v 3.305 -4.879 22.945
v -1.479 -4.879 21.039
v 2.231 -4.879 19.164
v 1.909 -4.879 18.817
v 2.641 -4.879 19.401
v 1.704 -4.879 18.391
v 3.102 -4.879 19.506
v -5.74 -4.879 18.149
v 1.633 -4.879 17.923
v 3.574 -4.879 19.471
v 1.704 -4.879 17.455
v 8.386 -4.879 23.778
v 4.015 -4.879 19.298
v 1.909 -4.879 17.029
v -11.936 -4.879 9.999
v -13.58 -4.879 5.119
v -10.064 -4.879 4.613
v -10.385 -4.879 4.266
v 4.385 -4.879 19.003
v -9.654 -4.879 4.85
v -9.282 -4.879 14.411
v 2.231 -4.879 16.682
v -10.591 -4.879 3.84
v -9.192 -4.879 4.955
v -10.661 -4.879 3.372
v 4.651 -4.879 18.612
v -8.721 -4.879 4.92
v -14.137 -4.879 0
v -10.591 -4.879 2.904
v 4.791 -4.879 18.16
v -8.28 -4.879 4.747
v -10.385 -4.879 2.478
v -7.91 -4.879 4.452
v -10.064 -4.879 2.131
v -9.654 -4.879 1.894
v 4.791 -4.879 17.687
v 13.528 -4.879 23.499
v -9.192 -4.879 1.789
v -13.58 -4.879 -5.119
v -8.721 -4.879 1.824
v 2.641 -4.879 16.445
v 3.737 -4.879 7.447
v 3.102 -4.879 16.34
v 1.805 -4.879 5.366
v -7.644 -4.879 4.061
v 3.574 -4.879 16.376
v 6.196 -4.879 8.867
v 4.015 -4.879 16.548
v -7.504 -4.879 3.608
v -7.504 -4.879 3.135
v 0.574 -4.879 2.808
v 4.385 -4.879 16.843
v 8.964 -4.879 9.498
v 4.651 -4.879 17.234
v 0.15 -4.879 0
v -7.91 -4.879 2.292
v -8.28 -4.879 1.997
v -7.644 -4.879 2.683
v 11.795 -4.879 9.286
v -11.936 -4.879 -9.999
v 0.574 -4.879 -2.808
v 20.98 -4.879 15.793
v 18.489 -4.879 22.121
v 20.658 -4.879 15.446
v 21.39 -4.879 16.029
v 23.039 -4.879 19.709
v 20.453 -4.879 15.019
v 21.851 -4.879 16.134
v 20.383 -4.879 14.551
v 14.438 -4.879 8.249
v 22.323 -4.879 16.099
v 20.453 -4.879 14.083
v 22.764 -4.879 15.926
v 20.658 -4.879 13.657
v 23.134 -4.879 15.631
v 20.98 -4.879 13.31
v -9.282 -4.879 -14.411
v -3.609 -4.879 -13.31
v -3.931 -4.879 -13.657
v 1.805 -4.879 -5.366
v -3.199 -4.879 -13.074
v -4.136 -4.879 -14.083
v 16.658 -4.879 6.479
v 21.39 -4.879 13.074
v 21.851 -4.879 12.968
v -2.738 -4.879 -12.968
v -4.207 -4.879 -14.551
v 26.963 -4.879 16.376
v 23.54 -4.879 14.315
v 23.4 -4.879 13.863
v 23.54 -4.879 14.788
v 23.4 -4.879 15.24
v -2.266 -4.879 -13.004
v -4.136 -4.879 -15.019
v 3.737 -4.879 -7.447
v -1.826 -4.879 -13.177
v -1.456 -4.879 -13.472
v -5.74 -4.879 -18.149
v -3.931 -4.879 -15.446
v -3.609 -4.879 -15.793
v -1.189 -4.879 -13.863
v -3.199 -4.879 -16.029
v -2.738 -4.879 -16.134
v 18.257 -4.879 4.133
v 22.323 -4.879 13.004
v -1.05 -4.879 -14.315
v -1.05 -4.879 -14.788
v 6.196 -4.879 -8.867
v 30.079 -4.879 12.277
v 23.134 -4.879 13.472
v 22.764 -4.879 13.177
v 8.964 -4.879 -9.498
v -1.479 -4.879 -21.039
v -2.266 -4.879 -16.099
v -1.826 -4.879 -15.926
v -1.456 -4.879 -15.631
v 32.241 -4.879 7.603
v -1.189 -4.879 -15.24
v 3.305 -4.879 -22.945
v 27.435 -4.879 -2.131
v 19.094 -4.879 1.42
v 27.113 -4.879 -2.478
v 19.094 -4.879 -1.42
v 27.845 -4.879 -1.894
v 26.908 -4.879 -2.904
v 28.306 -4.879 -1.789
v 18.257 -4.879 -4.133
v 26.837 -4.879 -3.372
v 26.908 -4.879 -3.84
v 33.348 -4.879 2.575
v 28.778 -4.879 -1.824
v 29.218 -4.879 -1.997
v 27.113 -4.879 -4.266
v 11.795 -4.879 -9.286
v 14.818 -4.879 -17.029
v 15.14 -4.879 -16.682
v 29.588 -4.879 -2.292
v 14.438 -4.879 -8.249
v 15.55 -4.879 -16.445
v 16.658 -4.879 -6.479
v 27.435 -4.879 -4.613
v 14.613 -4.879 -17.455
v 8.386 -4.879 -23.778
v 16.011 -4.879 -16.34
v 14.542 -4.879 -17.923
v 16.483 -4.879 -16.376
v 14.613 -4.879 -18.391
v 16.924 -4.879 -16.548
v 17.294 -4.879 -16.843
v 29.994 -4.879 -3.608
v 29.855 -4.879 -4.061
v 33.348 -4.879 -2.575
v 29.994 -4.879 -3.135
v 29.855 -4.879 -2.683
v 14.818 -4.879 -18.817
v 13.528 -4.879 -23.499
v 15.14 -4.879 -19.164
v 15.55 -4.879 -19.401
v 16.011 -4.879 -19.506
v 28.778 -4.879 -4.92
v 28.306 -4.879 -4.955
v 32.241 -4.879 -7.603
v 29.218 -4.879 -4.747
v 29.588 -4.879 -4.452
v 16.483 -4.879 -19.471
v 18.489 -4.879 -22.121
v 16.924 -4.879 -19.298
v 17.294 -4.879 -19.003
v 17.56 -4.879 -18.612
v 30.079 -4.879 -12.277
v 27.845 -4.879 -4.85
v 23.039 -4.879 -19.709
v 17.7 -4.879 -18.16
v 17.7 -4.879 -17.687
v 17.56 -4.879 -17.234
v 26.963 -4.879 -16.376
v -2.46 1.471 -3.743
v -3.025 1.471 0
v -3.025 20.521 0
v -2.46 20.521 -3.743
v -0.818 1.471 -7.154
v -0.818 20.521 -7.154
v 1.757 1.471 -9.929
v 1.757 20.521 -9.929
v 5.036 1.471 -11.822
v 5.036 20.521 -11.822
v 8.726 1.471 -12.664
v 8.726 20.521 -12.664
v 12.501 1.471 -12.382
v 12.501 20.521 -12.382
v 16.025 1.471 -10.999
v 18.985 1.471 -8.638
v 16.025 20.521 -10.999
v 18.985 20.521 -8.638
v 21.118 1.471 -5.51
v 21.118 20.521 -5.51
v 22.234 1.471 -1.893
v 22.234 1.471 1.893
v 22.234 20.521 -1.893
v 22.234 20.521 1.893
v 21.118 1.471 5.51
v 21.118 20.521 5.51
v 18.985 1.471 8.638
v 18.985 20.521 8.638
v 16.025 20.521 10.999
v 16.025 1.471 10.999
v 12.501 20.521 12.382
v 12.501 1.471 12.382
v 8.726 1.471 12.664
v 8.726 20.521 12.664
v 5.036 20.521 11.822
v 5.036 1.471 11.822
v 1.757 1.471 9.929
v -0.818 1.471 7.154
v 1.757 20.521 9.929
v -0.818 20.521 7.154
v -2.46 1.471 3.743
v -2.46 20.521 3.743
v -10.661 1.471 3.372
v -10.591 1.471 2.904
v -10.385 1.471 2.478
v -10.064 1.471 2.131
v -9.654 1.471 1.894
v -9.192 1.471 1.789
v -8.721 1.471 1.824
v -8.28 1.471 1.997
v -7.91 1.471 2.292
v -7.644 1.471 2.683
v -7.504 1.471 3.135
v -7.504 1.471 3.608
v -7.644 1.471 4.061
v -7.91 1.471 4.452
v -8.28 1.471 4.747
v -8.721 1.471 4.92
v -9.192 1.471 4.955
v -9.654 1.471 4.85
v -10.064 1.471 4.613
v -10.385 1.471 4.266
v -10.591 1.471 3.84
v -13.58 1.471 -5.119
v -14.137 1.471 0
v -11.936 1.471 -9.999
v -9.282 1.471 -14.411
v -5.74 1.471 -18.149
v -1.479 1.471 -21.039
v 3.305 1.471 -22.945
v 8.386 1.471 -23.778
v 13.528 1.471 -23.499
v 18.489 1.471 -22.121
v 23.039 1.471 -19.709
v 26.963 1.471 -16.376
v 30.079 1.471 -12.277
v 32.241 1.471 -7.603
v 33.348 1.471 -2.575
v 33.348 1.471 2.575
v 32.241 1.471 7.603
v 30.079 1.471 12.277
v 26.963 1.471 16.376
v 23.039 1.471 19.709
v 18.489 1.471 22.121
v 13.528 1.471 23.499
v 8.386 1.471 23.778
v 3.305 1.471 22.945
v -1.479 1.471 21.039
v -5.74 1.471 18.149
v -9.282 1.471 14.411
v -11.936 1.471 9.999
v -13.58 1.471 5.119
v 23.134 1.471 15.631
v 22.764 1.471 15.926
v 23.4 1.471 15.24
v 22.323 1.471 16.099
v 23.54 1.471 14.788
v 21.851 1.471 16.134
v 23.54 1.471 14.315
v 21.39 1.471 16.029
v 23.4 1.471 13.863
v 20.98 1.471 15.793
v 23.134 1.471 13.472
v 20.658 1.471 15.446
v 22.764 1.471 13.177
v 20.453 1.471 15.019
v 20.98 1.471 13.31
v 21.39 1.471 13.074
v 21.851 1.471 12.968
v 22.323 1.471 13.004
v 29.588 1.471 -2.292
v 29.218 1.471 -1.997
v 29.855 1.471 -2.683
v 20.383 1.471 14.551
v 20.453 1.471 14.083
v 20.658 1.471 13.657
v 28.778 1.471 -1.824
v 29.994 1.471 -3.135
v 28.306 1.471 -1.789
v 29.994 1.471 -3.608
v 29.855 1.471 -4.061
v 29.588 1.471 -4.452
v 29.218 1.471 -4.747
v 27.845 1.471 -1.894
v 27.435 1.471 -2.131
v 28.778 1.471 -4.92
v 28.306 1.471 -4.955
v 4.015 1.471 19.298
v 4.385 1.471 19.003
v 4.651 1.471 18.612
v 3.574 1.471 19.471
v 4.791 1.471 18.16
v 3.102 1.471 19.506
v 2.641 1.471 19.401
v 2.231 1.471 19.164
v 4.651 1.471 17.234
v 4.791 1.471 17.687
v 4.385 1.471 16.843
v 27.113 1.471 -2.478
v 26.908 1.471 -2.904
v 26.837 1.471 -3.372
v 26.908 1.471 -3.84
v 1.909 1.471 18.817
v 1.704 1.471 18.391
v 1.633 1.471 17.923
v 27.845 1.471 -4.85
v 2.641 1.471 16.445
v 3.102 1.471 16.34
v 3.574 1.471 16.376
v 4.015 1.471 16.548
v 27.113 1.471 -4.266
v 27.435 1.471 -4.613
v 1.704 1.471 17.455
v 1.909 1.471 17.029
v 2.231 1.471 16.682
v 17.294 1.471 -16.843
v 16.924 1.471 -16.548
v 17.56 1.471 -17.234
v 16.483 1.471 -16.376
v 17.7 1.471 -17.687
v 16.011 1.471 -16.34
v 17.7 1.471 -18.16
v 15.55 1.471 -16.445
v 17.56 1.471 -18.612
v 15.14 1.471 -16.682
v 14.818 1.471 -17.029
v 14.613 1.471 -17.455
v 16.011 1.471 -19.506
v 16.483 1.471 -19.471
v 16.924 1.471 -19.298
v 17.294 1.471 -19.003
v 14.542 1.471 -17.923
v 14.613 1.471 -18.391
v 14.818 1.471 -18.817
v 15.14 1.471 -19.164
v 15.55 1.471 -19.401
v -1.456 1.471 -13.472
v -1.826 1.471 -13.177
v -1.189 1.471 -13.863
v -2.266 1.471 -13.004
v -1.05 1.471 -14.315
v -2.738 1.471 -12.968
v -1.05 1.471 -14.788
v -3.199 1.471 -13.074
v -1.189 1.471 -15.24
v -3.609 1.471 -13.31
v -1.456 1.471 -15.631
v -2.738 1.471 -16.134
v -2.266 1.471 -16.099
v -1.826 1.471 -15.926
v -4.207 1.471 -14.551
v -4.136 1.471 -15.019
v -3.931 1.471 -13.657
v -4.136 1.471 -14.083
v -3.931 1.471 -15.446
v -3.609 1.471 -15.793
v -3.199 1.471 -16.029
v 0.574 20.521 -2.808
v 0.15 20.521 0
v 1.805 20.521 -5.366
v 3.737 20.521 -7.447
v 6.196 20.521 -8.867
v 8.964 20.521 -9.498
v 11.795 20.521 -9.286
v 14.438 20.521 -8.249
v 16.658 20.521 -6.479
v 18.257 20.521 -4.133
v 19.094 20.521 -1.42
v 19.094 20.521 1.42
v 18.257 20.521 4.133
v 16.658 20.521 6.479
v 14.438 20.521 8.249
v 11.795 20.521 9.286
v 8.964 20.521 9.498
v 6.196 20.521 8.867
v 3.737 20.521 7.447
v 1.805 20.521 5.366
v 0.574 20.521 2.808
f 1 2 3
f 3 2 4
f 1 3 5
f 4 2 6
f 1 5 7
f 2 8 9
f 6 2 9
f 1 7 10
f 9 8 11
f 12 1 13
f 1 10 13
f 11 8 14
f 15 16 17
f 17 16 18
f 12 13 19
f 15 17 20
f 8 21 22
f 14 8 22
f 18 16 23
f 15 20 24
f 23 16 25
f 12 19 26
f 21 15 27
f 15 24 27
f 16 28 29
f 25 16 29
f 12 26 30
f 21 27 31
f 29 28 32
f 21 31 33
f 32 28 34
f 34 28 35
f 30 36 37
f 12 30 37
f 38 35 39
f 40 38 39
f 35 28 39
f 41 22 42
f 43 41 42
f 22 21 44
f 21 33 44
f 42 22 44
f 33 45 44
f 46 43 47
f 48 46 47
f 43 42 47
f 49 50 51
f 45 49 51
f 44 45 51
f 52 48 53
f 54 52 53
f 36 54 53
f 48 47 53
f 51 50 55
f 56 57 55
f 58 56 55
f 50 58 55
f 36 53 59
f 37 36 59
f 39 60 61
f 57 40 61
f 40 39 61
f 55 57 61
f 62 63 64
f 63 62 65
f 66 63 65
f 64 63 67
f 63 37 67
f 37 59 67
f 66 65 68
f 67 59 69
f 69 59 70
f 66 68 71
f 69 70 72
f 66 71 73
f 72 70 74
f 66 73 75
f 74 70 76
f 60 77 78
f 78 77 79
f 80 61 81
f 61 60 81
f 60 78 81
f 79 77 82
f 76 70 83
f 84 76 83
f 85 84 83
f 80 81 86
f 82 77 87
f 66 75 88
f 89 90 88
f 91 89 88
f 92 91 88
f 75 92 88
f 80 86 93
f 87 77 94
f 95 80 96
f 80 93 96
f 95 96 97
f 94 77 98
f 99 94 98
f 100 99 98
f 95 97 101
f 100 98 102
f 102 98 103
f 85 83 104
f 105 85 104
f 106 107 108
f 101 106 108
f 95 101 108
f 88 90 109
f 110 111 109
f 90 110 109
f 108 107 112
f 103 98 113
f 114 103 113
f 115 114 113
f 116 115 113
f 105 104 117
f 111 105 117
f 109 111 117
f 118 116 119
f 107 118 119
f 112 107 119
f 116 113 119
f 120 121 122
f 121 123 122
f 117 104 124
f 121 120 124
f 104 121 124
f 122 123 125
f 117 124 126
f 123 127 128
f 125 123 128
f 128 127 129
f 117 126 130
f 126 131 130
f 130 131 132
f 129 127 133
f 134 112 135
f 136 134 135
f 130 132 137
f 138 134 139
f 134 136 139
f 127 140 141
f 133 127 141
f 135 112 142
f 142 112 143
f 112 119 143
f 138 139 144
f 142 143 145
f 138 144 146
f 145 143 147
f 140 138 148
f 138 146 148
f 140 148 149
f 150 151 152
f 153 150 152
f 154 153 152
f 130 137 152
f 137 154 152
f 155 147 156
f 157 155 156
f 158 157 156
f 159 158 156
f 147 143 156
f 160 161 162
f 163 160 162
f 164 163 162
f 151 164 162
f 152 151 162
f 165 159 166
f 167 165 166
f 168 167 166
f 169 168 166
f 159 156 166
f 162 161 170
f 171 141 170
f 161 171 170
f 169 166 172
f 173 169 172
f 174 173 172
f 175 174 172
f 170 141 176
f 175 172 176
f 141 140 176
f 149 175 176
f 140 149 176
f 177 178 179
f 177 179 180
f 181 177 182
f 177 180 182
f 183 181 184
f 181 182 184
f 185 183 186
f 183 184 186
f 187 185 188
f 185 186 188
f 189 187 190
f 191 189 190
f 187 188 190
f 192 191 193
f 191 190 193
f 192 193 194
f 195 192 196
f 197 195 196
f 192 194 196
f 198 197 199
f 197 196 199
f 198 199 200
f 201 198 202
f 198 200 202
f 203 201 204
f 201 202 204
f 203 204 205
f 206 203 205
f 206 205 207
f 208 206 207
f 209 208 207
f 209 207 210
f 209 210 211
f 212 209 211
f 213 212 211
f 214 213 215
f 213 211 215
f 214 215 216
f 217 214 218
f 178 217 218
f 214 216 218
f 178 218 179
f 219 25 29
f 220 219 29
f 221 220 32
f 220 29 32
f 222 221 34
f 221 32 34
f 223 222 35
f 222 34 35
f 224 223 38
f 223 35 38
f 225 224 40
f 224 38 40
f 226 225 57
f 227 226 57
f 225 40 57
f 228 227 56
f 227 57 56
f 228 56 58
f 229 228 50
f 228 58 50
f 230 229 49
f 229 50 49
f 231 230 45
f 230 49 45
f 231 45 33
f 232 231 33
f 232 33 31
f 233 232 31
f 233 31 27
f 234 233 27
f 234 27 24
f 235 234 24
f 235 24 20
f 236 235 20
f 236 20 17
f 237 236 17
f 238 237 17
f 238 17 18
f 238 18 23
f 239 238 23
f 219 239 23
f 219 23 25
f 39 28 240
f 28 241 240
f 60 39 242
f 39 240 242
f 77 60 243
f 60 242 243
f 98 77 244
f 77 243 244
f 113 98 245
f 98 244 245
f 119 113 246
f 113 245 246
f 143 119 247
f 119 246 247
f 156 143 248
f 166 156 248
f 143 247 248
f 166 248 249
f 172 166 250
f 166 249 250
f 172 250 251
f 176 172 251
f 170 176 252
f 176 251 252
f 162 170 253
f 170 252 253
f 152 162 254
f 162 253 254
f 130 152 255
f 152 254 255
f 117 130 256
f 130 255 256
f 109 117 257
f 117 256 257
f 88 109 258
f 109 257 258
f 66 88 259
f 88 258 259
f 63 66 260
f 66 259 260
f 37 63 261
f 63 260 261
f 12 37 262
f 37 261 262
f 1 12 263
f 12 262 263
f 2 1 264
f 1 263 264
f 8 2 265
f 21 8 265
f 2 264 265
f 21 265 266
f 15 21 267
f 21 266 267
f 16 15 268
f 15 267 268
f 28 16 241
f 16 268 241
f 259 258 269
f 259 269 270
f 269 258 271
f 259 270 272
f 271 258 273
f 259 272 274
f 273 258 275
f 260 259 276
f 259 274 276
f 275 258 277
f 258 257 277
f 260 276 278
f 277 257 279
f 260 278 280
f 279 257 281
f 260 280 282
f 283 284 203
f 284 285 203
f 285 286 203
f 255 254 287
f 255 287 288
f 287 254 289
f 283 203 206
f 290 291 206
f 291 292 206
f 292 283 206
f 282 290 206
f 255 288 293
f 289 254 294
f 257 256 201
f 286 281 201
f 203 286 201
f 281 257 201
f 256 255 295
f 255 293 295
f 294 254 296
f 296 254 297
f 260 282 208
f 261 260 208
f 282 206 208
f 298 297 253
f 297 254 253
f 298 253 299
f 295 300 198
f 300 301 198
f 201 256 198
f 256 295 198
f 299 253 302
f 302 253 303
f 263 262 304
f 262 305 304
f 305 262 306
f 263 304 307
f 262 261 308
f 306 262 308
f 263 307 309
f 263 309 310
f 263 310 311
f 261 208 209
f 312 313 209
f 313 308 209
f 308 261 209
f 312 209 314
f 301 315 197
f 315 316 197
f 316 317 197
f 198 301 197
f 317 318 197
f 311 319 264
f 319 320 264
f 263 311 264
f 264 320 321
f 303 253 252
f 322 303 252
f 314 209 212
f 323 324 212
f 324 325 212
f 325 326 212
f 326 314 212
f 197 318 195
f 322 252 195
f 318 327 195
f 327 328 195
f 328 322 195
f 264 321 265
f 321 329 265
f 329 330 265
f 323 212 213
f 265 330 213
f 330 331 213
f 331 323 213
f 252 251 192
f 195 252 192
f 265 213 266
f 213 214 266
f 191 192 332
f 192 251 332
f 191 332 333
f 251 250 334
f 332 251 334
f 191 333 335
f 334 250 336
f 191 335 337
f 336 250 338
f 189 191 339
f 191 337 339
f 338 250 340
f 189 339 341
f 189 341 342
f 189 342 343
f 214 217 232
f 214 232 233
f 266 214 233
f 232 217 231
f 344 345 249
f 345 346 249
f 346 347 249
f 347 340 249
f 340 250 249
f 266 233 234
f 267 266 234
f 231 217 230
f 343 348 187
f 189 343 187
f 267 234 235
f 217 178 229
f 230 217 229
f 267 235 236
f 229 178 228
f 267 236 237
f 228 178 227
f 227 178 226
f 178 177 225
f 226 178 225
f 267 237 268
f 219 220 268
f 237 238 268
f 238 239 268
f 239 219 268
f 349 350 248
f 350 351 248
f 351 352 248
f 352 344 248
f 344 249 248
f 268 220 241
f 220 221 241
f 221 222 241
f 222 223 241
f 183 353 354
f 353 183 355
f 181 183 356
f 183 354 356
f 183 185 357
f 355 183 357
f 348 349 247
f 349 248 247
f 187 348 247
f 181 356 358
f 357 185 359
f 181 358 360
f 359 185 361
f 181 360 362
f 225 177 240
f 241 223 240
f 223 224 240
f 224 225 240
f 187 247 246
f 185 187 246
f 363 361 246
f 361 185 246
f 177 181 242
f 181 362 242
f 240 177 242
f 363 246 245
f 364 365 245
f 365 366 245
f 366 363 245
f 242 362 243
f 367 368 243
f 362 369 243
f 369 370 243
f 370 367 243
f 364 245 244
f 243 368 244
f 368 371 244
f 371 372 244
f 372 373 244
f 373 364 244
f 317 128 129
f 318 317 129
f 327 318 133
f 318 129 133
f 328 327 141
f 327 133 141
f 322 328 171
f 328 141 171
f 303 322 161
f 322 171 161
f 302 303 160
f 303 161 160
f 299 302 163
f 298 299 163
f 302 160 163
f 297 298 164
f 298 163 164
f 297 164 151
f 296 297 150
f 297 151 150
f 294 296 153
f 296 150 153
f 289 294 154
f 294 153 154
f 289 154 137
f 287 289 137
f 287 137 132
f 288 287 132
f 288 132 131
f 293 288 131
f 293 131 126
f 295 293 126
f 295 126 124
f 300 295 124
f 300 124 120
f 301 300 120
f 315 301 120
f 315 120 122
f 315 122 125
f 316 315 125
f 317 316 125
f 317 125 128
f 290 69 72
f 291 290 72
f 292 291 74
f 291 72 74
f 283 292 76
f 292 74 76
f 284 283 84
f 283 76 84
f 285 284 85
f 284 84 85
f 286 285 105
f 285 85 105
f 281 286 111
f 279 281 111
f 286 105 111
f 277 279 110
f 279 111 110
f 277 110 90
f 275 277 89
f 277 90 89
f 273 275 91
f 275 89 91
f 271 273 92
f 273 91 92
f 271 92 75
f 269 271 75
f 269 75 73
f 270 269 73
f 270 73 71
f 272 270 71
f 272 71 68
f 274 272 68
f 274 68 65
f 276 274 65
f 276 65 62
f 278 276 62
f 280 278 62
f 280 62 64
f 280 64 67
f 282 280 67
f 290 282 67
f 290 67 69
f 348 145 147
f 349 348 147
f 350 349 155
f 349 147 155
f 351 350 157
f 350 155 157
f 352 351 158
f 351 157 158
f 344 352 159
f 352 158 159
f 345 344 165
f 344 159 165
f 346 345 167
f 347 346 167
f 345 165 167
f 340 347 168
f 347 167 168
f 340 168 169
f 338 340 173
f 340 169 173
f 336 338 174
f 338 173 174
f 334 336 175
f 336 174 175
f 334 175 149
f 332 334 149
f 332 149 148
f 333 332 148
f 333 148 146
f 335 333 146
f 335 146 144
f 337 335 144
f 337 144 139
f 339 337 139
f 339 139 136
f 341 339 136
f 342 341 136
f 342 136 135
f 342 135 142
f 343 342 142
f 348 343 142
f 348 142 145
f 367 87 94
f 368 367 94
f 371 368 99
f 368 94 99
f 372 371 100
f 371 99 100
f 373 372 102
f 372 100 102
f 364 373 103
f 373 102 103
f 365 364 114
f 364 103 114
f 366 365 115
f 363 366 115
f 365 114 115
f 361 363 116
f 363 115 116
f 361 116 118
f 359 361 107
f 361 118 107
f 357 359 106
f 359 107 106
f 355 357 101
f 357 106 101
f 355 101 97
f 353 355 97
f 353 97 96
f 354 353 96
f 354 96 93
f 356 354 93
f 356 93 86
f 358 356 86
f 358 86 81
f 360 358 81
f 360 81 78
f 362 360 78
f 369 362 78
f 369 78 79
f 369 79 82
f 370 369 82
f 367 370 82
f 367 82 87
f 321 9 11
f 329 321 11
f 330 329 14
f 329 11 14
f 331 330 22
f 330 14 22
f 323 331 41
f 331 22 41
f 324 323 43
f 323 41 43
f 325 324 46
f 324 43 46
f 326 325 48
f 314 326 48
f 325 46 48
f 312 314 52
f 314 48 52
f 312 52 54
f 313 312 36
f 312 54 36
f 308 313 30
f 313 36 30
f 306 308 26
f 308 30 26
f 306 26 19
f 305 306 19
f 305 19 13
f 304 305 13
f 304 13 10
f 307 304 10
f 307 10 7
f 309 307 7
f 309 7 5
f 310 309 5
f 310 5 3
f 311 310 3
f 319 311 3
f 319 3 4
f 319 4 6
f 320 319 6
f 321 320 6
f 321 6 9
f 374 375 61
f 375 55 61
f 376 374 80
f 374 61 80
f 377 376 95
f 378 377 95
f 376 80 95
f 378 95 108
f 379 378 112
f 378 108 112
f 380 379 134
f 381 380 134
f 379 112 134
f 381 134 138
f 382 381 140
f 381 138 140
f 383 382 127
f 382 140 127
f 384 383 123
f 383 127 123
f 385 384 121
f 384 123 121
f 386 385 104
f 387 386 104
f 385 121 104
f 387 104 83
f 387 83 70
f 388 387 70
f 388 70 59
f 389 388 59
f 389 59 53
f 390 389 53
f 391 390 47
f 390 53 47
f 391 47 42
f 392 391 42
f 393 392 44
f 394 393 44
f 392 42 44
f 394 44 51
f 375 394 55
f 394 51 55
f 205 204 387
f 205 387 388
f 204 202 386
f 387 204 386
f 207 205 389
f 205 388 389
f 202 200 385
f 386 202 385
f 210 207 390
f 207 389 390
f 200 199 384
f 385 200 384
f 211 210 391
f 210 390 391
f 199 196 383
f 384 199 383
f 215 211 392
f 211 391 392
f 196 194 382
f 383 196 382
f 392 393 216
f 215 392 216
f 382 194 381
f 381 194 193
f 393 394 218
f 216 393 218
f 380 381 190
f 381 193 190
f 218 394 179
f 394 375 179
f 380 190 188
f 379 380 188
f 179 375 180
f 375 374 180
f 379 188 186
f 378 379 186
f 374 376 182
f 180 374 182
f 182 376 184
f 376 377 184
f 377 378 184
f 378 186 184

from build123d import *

# Parameters (mm, degrees)
F_1_8_0_125_DIAMETER_HOLE1_D = 3.175


with BuildPart() as part:
    # Sketch1 → Revolve1 (revolve)
    with BuildSketch(Plane.XY):
        Polygon((0.150394737, -4.879473684), (-14.137105263, -4.879473684), (-14.137105263, 1.470526316), (-3.024605263, 1.470526316), (-3.024605263, 20.520526316), (0.150394737, 20.520526316), align=None)
    revolve(axis=Axis((9.675394737, 1.470526316, 0), (0, -1, 0)))

    # 1/8 (0.125) Diameter Hole1 (through all)
    with Locations(Plane(origin=(0, 1.470526316, 0), x_dir=(1, 0, 0), z_dir=(0, 1, 0))):
        with Locations((3.220899988, -17.923225088), (-9.073820881, -3.371856123), (-2.619326132, 14.551368965), (16.129889486, 17.923225088), (28.424610355, 3.371856123), (21.970115606, -14.551368965), (9.675394737, 0)):
            Hole(F_1_8_0_125_DIAMETER_HOLE1_D / 2)


solid = part.part
